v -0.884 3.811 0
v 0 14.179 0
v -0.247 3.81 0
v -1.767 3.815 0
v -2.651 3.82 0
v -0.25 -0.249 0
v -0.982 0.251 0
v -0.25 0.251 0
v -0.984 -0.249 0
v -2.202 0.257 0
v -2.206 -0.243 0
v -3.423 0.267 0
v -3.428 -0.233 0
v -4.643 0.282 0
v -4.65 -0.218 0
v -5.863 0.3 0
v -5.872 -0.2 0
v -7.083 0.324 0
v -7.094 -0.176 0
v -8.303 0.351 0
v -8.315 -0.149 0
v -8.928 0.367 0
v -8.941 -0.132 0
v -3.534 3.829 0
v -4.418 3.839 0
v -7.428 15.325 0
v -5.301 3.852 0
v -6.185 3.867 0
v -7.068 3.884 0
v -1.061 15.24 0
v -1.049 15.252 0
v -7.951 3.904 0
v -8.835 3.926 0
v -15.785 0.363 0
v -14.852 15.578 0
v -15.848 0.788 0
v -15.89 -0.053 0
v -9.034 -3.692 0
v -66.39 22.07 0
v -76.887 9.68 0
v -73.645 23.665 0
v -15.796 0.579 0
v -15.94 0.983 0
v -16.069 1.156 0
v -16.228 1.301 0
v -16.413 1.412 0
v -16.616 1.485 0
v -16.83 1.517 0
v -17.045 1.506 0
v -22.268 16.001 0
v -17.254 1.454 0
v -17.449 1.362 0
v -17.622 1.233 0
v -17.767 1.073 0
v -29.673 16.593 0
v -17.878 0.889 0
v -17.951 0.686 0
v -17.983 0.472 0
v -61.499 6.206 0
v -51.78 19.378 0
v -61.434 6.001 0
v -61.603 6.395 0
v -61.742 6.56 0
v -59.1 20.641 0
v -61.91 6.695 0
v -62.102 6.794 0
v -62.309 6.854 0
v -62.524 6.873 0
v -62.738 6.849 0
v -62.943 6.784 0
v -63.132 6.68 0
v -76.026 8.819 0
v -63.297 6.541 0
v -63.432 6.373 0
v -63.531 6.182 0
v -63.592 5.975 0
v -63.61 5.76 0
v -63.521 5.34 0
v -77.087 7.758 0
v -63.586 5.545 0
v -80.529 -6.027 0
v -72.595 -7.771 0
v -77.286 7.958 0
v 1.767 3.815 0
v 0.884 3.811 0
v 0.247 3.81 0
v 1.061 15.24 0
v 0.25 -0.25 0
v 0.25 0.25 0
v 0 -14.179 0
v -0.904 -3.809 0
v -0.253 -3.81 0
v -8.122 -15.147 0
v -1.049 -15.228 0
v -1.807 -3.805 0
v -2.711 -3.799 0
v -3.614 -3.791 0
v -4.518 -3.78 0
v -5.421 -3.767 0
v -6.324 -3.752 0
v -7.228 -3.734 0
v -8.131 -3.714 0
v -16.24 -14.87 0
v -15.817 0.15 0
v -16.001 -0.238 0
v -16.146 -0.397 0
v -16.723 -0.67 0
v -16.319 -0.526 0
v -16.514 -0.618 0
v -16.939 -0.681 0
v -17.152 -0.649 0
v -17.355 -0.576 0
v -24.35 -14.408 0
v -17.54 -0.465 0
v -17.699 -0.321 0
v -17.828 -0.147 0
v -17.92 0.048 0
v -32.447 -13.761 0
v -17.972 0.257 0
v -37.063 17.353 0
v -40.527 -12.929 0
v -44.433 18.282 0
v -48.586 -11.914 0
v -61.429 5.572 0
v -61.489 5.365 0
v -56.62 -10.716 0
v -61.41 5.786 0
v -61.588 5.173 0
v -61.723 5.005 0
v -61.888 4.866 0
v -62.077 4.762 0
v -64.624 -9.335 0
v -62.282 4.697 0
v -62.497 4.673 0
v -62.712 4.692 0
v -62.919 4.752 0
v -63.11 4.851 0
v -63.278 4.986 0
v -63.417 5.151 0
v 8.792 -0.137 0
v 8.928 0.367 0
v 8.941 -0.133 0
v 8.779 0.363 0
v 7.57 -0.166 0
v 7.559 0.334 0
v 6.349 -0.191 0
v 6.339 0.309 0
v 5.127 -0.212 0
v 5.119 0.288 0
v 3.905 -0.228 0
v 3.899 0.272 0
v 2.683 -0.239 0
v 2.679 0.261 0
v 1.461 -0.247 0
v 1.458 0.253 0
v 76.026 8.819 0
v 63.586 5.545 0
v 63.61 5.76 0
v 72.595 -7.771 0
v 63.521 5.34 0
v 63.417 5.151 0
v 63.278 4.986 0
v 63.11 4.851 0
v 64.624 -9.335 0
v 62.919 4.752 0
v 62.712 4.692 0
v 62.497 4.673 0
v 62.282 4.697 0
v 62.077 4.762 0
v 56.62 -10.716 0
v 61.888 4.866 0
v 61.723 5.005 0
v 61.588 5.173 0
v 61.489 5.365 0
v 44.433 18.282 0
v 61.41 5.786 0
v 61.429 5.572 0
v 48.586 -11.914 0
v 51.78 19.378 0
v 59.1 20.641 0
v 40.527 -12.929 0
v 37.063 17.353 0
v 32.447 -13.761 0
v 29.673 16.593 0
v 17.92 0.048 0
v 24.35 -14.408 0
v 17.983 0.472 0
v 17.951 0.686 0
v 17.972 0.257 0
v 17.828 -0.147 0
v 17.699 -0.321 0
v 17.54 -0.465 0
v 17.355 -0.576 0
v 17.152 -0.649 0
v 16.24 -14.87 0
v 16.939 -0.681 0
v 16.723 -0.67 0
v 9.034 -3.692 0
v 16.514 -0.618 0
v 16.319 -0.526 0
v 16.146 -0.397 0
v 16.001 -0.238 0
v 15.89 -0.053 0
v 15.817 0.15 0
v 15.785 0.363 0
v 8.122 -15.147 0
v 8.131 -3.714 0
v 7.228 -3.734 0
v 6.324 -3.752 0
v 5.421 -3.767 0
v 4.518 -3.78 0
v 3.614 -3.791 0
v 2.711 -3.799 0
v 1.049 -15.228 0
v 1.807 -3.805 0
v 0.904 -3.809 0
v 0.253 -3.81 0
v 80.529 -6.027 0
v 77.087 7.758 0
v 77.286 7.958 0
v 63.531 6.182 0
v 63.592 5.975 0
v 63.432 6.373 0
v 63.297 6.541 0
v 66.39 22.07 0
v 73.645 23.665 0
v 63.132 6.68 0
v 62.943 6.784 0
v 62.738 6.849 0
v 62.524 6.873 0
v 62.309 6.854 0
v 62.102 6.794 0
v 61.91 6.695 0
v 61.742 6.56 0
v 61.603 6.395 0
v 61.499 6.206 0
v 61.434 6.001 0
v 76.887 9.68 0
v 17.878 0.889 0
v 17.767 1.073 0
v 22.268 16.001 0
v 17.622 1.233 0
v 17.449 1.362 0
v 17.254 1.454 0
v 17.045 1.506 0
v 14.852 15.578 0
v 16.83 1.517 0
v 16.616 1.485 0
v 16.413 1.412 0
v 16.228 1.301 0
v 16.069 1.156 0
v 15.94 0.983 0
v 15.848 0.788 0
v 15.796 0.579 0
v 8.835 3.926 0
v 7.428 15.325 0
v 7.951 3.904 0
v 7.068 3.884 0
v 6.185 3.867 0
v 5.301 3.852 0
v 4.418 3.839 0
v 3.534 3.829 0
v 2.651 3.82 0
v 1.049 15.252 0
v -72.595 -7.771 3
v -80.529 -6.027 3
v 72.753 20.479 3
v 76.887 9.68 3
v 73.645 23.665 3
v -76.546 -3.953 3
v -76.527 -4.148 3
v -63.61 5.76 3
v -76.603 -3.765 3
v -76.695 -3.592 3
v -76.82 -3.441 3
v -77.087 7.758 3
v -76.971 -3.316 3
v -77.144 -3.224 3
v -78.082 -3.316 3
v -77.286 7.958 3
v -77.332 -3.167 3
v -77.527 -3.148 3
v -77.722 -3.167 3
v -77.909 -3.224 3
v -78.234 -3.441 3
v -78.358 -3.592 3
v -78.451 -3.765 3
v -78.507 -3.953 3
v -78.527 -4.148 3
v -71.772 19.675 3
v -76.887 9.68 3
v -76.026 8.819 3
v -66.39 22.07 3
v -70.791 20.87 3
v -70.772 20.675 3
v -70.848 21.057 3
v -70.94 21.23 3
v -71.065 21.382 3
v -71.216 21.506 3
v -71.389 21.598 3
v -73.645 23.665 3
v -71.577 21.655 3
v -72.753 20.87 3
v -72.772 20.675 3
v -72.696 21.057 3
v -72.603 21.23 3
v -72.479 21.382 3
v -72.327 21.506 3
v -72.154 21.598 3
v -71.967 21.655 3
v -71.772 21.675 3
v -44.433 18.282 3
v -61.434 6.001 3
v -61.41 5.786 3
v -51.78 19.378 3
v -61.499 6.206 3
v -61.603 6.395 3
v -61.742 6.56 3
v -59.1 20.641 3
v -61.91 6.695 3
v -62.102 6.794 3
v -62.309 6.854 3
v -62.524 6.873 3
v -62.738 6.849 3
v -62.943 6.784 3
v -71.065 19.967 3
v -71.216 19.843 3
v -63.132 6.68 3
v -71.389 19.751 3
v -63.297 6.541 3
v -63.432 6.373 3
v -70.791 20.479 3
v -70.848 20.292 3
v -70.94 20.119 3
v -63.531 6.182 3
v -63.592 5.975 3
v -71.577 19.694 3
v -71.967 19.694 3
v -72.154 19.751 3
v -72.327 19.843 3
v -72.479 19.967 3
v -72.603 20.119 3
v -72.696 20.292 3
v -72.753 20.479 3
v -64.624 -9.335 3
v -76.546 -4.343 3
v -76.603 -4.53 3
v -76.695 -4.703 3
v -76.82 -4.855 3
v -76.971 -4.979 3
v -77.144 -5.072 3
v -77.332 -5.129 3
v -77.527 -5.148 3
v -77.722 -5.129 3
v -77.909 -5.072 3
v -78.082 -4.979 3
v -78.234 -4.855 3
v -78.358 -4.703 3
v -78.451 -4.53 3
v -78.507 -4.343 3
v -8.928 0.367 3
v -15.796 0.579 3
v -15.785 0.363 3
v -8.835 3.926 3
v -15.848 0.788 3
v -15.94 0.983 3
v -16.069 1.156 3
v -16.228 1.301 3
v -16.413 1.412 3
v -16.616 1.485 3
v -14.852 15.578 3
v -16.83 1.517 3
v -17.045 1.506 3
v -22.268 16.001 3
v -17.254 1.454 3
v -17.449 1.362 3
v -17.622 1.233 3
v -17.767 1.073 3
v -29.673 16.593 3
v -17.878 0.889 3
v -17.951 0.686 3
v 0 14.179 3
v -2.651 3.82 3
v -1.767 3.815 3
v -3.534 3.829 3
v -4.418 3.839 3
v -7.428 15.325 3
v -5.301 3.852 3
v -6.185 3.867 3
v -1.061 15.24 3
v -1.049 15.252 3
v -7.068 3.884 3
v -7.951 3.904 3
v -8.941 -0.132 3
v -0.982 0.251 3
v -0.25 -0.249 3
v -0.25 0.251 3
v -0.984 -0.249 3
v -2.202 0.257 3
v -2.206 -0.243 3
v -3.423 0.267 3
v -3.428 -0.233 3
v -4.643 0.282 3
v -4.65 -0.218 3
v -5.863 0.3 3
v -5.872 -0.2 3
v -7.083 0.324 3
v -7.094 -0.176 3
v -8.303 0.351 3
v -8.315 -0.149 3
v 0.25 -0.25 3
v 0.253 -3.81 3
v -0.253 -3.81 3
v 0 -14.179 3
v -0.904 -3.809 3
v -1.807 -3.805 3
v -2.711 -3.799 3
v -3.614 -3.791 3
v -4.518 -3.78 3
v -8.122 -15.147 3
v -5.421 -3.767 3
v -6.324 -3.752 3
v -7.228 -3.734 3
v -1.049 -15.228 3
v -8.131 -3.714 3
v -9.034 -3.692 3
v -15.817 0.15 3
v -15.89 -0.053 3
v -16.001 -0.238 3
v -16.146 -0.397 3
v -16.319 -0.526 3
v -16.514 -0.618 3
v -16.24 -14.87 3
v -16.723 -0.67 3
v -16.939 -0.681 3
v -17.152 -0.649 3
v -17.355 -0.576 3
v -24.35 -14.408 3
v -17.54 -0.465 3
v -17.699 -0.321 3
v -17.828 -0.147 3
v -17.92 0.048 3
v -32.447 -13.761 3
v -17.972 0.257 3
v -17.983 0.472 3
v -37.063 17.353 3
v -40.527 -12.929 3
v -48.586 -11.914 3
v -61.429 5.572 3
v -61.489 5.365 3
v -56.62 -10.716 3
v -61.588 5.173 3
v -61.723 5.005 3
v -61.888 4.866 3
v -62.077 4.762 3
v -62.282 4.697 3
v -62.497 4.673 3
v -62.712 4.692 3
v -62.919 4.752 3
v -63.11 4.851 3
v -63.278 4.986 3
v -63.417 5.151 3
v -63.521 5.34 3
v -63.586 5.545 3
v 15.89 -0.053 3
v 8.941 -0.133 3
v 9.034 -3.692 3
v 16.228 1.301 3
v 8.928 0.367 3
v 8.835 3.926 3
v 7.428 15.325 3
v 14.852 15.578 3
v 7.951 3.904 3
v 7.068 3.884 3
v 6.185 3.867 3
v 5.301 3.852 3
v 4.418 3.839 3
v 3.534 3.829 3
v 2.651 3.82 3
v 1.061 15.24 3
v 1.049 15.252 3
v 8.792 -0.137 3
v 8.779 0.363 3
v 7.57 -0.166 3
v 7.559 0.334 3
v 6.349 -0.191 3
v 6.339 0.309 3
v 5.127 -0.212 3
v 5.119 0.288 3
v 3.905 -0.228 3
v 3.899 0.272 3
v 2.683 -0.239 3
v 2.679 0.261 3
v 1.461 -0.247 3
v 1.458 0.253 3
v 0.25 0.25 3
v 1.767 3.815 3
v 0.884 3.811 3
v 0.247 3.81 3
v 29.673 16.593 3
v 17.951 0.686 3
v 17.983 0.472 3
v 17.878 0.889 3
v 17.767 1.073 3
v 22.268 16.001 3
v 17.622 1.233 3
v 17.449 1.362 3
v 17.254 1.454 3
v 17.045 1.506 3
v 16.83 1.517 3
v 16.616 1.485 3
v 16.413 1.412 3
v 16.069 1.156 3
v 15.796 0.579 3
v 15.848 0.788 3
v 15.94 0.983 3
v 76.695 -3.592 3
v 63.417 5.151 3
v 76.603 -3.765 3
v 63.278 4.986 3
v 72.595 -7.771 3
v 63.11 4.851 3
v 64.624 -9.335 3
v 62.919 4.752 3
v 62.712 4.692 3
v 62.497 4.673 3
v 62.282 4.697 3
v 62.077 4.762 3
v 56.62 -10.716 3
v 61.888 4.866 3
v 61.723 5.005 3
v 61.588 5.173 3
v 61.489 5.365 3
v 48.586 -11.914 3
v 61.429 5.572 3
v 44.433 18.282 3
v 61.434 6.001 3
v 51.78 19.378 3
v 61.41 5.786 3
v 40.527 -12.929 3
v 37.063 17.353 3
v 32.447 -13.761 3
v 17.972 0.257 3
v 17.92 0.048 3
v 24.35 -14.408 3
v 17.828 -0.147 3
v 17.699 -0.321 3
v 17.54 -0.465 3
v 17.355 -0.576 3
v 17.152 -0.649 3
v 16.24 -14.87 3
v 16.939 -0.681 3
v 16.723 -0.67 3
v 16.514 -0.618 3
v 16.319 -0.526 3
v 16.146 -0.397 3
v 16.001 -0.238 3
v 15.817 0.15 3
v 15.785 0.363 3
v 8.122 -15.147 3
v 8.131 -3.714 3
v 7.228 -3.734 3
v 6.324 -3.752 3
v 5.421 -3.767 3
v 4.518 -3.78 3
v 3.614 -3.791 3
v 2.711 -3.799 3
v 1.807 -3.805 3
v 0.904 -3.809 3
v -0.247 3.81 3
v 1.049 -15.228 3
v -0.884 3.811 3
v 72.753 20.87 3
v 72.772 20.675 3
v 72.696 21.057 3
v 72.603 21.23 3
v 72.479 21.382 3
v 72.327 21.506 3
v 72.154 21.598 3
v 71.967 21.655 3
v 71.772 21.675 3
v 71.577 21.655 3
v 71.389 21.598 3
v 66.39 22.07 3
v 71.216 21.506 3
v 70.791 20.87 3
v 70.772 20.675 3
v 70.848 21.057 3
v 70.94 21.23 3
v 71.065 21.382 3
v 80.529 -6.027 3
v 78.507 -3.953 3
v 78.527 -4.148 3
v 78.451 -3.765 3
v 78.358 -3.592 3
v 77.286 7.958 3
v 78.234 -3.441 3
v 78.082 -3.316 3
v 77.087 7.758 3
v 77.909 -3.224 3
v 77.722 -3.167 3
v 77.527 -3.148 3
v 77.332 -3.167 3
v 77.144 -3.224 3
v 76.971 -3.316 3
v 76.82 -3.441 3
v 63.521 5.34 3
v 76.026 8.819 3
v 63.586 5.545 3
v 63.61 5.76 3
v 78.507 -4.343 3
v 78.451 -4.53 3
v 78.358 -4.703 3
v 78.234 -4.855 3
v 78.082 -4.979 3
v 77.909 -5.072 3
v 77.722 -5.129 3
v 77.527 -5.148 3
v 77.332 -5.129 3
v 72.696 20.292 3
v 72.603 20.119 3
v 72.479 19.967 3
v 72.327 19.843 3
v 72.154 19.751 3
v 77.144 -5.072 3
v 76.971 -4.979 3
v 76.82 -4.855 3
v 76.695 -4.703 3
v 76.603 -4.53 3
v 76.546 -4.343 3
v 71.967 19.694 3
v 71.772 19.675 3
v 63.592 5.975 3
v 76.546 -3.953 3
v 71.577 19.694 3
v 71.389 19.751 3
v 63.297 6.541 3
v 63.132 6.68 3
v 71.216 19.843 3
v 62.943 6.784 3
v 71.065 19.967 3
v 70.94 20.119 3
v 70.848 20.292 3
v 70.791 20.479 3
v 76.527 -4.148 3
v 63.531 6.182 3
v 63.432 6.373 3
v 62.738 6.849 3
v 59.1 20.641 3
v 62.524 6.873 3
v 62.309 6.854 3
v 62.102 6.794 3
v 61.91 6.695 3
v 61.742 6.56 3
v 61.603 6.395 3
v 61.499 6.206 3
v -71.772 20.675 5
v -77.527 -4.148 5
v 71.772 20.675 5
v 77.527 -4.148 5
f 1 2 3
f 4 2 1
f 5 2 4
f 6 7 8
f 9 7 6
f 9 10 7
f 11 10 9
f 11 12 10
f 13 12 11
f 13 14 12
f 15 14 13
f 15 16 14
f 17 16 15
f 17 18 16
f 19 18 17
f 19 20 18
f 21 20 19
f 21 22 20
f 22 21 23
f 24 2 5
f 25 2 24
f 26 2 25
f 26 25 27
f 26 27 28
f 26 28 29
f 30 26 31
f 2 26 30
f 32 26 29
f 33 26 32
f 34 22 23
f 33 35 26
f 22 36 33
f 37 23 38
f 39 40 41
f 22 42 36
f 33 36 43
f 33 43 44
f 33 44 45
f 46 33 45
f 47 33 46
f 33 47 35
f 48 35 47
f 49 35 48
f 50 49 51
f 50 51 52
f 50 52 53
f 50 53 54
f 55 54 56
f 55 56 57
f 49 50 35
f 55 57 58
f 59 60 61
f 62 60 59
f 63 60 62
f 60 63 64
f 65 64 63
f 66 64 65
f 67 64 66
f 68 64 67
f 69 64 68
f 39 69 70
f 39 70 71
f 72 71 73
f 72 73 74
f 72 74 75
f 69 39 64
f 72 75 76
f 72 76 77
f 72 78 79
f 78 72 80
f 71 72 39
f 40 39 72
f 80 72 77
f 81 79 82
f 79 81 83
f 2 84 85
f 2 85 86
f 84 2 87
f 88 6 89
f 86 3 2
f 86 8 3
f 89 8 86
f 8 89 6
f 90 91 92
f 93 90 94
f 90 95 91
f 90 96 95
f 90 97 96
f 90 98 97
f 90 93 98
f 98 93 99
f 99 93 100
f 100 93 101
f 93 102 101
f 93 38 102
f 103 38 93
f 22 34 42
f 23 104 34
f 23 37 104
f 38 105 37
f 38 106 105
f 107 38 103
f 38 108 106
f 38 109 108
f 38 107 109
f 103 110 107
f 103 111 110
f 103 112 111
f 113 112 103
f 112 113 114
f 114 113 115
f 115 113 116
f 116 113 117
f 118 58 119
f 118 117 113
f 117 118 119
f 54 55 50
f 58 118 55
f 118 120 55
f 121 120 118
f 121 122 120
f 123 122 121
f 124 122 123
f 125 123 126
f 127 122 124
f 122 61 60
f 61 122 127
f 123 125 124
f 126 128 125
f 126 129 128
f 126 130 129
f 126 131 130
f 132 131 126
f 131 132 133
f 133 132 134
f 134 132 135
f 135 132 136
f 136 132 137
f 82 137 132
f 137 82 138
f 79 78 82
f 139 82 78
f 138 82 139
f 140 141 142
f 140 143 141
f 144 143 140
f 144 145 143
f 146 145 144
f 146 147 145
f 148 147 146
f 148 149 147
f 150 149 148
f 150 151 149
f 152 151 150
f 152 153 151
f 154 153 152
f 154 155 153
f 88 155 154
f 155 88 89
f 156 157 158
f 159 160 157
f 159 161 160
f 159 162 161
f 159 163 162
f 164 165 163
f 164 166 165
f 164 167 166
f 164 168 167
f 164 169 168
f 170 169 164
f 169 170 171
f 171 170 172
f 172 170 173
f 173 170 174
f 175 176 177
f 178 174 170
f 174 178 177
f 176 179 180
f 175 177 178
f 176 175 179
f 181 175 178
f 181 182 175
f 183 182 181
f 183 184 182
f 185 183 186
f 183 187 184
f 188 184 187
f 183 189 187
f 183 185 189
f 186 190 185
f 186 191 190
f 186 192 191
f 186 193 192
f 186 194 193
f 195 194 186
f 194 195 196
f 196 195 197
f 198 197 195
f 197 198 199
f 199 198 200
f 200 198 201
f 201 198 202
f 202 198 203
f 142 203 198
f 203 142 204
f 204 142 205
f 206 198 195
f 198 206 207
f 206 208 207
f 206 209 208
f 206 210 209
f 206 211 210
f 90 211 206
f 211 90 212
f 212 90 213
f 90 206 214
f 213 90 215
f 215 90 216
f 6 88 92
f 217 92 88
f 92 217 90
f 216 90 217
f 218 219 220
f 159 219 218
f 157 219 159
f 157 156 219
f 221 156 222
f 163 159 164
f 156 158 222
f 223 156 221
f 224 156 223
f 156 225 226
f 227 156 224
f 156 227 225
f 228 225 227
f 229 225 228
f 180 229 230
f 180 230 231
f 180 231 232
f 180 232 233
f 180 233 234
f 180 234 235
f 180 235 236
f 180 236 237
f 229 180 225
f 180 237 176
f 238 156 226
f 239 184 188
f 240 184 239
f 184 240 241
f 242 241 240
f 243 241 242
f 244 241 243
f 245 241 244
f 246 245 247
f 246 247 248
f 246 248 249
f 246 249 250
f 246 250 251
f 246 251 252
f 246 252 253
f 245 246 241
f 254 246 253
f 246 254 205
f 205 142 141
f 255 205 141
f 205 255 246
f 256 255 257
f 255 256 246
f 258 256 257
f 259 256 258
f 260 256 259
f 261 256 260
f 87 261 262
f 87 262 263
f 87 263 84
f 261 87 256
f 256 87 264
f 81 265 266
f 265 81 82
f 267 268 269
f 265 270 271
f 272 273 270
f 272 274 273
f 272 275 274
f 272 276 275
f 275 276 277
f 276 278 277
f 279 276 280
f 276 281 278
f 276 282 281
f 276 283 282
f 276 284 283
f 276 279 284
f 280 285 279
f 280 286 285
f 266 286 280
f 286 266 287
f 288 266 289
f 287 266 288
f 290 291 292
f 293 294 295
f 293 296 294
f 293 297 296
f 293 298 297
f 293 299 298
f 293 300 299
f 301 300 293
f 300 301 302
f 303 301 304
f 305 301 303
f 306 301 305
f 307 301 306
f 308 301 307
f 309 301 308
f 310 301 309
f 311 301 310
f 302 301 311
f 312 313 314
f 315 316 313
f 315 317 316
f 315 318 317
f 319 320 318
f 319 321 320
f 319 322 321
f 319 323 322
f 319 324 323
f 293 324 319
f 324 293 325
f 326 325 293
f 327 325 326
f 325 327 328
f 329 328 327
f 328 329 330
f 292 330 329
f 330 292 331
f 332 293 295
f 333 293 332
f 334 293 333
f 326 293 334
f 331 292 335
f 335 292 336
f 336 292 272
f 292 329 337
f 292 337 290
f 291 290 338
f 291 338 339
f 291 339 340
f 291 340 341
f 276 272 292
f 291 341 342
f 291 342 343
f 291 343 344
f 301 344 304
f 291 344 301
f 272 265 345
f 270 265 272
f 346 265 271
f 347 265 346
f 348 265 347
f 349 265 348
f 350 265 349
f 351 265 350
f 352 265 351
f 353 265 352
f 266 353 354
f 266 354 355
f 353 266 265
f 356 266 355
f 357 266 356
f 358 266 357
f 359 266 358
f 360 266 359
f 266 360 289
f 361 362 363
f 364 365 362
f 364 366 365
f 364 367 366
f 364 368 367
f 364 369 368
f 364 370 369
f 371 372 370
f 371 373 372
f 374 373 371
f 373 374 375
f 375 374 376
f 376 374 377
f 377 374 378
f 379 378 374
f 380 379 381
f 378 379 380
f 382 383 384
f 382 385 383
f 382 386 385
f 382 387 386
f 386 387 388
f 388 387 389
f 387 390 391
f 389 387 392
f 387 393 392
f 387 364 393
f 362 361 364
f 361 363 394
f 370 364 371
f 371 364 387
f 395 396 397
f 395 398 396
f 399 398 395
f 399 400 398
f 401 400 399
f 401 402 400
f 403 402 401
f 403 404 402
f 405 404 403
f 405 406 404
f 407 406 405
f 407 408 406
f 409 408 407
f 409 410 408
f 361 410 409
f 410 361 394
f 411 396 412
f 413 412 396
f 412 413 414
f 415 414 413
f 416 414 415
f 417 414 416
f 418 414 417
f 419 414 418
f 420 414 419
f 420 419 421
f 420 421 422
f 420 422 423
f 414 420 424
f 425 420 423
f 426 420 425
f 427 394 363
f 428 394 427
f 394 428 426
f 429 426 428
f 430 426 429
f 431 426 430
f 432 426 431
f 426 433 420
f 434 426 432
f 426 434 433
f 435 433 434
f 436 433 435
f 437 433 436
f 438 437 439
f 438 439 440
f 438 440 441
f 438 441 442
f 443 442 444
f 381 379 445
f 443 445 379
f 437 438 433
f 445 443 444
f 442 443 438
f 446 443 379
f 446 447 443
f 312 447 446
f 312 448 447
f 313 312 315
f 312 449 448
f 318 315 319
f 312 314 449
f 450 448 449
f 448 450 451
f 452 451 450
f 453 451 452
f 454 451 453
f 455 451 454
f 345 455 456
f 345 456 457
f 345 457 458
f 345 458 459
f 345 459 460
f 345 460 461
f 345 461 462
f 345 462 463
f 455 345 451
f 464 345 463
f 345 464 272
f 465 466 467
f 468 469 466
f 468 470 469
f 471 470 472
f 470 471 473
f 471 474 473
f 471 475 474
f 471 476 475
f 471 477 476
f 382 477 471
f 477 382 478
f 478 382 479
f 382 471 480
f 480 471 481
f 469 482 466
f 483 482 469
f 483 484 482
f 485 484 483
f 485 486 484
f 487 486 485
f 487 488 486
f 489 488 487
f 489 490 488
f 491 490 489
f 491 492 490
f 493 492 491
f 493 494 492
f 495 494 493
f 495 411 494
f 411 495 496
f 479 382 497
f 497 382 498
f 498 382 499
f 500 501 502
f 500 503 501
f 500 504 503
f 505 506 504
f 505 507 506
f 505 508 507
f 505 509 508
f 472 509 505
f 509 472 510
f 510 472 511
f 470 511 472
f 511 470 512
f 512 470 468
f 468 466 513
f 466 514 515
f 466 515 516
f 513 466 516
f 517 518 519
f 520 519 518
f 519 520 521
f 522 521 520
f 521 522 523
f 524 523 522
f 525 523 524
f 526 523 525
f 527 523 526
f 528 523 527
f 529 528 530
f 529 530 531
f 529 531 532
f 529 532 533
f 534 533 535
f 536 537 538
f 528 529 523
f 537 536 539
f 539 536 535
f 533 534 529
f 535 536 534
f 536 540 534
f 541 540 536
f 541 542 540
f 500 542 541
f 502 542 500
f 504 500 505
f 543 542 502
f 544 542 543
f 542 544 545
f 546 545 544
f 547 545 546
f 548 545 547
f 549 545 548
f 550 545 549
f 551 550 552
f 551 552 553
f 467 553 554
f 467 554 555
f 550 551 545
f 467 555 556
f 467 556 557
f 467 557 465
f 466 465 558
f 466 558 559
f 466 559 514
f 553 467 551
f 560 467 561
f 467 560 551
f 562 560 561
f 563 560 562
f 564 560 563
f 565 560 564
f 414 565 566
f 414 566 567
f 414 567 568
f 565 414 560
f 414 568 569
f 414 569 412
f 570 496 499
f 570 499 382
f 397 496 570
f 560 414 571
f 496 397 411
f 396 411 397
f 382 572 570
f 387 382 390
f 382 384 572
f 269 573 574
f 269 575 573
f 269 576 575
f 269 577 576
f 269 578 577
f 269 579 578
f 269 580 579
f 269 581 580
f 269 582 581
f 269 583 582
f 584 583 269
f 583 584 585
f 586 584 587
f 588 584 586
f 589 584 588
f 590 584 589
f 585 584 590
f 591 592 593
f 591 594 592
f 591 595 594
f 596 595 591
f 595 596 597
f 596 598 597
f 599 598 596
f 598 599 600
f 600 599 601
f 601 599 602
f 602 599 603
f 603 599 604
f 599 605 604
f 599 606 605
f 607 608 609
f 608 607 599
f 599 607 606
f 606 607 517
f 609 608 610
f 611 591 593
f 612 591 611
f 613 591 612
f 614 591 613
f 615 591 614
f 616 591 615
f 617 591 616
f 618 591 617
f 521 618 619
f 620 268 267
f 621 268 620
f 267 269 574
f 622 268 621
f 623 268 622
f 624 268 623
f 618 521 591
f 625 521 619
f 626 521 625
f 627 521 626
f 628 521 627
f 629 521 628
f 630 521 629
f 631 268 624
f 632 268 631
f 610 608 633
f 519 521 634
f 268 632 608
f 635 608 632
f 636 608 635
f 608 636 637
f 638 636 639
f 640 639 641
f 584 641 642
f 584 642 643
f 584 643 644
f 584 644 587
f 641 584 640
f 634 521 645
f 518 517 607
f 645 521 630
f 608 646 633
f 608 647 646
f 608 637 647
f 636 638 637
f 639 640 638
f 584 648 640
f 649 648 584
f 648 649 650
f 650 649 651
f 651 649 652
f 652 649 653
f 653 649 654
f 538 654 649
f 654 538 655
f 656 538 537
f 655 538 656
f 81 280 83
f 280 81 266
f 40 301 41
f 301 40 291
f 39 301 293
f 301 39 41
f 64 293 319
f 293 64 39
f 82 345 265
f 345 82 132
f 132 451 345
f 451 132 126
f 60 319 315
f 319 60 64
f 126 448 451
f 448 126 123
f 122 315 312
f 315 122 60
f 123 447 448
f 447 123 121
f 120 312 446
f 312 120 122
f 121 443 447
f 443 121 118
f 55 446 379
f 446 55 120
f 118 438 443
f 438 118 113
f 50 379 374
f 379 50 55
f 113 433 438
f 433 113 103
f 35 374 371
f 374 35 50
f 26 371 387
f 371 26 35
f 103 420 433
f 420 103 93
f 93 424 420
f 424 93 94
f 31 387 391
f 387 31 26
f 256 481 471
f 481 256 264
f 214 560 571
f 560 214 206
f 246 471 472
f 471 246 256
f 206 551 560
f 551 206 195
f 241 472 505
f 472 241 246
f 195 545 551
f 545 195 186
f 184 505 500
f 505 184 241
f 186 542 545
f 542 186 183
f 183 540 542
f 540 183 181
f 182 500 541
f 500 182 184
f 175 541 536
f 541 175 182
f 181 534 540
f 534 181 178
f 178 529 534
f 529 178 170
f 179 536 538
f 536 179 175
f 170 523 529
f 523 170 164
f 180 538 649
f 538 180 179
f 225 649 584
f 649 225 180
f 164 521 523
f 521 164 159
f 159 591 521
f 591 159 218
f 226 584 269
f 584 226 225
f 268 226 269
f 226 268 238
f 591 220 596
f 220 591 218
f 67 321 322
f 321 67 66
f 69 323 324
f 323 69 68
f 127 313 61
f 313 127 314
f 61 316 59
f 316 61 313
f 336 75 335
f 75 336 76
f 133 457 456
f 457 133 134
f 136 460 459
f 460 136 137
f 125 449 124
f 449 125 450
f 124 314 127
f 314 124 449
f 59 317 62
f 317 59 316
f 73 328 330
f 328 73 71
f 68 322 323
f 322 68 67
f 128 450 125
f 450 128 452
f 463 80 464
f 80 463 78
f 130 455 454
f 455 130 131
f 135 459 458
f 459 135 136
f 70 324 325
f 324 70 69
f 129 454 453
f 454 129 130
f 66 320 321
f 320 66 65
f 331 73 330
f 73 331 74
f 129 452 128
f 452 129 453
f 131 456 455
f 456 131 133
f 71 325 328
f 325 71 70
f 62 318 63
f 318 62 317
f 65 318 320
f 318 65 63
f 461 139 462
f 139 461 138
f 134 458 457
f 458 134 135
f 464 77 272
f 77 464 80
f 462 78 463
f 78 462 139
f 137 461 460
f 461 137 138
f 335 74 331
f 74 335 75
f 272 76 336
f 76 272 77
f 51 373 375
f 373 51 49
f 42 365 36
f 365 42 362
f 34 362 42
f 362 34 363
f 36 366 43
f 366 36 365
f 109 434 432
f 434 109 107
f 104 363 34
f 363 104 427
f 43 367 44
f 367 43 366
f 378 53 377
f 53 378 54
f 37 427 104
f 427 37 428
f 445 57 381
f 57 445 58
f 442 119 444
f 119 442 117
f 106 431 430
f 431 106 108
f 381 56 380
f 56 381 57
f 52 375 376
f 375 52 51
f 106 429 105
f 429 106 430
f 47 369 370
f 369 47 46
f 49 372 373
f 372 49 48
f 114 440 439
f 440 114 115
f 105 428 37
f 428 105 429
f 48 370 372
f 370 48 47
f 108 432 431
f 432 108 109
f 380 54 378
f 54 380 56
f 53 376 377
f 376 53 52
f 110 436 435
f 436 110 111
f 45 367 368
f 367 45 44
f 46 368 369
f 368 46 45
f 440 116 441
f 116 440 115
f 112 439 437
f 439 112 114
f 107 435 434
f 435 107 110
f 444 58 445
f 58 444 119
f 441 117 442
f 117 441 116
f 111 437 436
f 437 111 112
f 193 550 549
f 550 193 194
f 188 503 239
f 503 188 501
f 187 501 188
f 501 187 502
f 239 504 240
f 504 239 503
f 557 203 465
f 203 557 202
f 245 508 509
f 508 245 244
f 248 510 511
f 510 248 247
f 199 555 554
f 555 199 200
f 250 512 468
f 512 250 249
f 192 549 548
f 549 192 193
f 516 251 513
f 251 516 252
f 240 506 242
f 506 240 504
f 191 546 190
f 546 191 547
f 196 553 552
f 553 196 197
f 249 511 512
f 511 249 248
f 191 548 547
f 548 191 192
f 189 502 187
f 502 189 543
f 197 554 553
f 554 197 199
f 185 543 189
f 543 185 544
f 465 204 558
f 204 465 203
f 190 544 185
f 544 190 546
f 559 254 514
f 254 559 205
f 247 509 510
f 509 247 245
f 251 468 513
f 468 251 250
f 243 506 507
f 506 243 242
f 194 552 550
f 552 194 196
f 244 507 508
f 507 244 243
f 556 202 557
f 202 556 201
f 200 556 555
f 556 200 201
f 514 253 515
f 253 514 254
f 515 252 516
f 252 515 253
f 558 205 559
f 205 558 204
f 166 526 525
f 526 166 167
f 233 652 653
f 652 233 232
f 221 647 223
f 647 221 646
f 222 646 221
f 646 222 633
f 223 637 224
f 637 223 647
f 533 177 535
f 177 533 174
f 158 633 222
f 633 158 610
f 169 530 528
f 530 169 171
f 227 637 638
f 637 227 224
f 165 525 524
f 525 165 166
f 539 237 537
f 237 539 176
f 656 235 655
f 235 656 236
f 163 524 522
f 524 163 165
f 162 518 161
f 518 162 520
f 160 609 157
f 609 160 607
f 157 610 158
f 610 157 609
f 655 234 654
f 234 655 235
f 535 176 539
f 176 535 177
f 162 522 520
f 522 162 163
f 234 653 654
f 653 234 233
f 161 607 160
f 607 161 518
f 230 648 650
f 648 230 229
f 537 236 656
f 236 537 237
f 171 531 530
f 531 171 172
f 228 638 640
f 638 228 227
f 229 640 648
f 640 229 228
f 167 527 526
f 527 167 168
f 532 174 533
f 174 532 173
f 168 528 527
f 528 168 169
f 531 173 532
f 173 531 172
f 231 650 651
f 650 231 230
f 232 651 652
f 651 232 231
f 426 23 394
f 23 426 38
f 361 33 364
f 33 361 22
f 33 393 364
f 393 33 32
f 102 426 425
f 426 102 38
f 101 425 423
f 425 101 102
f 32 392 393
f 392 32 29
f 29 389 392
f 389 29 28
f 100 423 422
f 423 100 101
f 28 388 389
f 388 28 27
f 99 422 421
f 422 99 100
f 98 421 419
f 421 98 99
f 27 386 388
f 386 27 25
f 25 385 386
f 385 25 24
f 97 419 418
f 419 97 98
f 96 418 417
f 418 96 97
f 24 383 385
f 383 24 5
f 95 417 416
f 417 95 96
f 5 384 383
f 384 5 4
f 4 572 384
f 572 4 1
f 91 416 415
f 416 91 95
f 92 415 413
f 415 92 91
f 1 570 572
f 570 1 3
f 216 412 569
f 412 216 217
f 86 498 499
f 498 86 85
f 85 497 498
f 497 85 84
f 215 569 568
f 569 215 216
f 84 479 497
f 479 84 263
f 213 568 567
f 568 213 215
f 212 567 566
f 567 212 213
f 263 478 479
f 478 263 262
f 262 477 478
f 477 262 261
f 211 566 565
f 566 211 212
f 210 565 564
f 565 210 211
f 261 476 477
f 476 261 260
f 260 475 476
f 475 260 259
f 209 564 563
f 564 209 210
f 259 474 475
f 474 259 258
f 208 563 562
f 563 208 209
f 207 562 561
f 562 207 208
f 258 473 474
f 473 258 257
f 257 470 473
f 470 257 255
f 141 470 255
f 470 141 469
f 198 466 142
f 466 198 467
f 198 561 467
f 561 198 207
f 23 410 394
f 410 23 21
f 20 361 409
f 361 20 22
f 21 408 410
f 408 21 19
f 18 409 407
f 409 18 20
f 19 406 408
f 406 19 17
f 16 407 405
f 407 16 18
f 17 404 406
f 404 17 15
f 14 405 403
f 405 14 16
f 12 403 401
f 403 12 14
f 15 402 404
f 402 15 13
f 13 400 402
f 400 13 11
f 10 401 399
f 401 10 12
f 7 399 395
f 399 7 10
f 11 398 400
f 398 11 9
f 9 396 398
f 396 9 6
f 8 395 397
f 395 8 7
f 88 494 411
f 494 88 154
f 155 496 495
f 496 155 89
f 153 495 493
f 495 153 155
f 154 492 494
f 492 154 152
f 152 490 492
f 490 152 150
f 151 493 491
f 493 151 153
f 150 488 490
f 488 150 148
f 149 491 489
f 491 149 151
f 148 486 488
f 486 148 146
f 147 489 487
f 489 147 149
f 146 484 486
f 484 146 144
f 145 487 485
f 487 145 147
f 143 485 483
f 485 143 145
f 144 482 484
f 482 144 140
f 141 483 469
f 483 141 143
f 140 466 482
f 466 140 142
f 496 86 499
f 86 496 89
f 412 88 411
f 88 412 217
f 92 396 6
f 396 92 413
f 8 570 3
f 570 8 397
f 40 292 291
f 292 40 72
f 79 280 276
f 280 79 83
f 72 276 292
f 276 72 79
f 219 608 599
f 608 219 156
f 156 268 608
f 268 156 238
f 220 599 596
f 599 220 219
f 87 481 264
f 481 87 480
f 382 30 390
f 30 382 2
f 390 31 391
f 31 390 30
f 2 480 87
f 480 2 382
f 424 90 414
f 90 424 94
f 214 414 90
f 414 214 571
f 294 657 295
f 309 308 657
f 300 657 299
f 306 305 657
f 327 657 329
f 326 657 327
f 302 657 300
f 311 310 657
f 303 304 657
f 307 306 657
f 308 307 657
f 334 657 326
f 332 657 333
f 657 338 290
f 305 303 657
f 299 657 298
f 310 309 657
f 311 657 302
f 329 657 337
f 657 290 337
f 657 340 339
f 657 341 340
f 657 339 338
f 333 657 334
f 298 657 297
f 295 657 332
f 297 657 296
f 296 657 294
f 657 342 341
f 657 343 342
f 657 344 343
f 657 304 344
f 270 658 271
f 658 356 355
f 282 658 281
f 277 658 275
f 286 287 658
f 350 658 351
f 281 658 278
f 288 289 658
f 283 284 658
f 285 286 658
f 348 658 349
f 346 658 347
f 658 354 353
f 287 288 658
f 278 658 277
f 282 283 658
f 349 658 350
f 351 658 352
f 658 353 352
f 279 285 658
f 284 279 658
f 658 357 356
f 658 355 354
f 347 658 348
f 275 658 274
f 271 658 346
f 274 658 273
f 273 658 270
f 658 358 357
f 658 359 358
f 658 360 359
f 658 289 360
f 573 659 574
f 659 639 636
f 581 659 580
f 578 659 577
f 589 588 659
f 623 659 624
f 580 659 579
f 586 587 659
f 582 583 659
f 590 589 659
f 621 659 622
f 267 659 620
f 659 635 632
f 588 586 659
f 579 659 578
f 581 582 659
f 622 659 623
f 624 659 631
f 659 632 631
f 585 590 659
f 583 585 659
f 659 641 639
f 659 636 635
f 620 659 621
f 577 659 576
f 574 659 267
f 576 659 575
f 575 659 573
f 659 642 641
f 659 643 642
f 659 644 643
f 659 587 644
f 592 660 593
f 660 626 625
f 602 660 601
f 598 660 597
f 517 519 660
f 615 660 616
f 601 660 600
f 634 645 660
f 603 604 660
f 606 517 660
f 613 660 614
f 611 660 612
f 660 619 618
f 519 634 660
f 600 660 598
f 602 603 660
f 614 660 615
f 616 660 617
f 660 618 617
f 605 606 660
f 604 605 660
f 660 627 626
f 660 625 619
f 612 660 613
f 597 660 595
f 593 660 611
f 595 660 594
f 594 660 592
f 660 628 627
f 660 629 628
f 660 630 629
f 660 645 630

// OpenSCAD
circle_diameter_inches = 26.875;
outer_gap_inches = 1.81;
inner_gap_inches = 1.33;

additional_width_angle = 5;

block_height_inches = 1.2;

block_thickness_mm = 3;
crosshair_thickness_mm = 0.5;

guide_hole_size_mm = 2.2;

window_width_degrees = 3;
window_height_inches = 0.3;

notch_width_mm = 1.5;

spike_width_mm = 2;
spike_height_mm = 2;
spike_inset_mm = 2.5;

circle_radius_inches = circle_diameter_inches * 0.5;
circle_circumference_inches = circle_diameter_inches * PI;

block_height_mm = block_height_inches * 25.4;
window_height_mm = window_height_inches * 25.4;
circle_radius_mm = circle_radius_inches * 25.4;
circle_circumference_mm = circle_circumference_inches * 25.4;

outer_gap_radians = outer_gap_inches / circle_circumference_inches * 2 * PI;
inner_gap_radians = inner_gap_inches / circle_circumference_inches * 2 * PI;

outer_gap_degrees = outer_gap_radians * 180 / PI;
inner_gap_degrees = inner_gap_radians * 180 / PI;

block_width_degrees = inner_gap_degrees + 2 * outer_gap_degrees + additional_width_angle;

module block(from_angle, to_angle, block_thickness_mm, block_height_mm, segments = 20)
{
  for (segment = [0 : segments - 1])
  {
    t1 = segment / segments;
    t2 = (segment + 1) / segments;

    a1 = (1 - t1) * from_angle + t1 * to_angle;
    a2 = (1 - t2) * from_angle + t2 * to_angle;

    x1 = sin(a1) * (circle_radius_mm - block_height_mm / 2);
    y1 = -cos(a1) * (circle_radius_mm - block_height_mm / 2);

    x2 = sin(a2) * (circle_radius_mm - block_height_mm / 2);
    y2 = -cos(a2) * (circle_radius_mm - block_height_mm / 2);

    x3 = sin(a2) * (circle_radius_mm + block_height_mm / 2);
    y3 = -cos(a2) * (circle_radius_mm + block_height_mm / 2);

    x4 = sin(a1) * (circle_radius_mm + block_height_mm / 2);
    y4 = -cos(a1) * (circle_radius_mm + block_height_mm / 2);
    
    linear_extrude(block_thickness_mm, slices = 1)
    translate([0, circle_radius_mm, 0])
    polygon(
      [
        [x1, y1],
        [x2, y2],
        [x3, y3],
        [x4, y4],
      ]);
  }
}

module guide(angle)
{
  translate([0, circle_radius_mm, 0])
  rotate([0, 0, angle])
  translate([0, -circle_radius_mm, 0])
  cylinder(10, d = guide_hole_size_mm, center = true, $fn = 32);
}

module window()
{
  crosshair_thickness_degrees = 360 * crosshair_thickness_mm / circle_circumference_mm;
  difference()
  {
    translate([0, 0, -5])
    block(-window_width_degrees * 0.5, window_width_degrees * 0.5, 10, window_height_mm);
    
    translate([0, 0, -4])
    block(-window_width_degrees * 0.5 - 0.1, window_width_degrees * 0.5 + 1, 8, crosshair_thickness_mm);
    translate([0, 0, -4])
    block(-crosshair_thickness_degrees * 0.5, crosshair_thickness_degrees * 0.5, 8, window_height_mm + 1, segments = 1);
  }
}

module base_block()
{
  block(-block_width_degrees * 0.5, +block_width_degrees * 0.5, block_thickness_mm, block_height_mm);
}

module guides()
{
  guide(-outer_gap_degrees - inner_gap_degrees * 0.5);
  guide(-inner_gap_degrees * 0.5);
  guide(inner_gap_degrees * 0.5);
  guide(outer_gap_degrees + inner_gap_degrees * 0.5);
}

module notch(angle_offset, radius_offset)
{
  radius = circle_radius_mm + radius_offset;
  angle = angle_offset;
  
  x = sin(angle) * radius;
  y = -cos(angle)* radius;
  
  translate([x, y + circle_radius_mm, 0])
  rotate([0, 0, 45])
  cube([notch_width_mm, notch_width_mm, 10], center = true);
}

module notches()
{
  for (x = [-1, 1])
    notch(x * block_width_degrees / 2, 0);
  
  for (y = [-1, 1])
    notch(0, y * block_height_mm / 2);
}

union()
{
  difference()
  {
    base_block();

    guides();

    window();

    notches();
  }
  
  for (side = [-1, 1])
    for (edge = [-1, 1])
    {
      radius = circle_radius_mm + (block_height_mm * 0.5 - spike_inset_mm) * edge;
      
      circumference = radius * 2 * PI;
      
      spike_inset_angle = 360 * spike_inset_mm / circumference;
      
      angle = (block_width_degrees * 0.5 - spike_inset_angle) * side;
      
      x = sin(angle) * radius;
      y = circle_radius_mm - cos(angle) * radius;

      color("red")
      translate([x, y, block_thickness_mm])
      cylinder(spike_height_mm, d1 = spike_width_mm, d2 = 0, $fn = 32);
    }
}
